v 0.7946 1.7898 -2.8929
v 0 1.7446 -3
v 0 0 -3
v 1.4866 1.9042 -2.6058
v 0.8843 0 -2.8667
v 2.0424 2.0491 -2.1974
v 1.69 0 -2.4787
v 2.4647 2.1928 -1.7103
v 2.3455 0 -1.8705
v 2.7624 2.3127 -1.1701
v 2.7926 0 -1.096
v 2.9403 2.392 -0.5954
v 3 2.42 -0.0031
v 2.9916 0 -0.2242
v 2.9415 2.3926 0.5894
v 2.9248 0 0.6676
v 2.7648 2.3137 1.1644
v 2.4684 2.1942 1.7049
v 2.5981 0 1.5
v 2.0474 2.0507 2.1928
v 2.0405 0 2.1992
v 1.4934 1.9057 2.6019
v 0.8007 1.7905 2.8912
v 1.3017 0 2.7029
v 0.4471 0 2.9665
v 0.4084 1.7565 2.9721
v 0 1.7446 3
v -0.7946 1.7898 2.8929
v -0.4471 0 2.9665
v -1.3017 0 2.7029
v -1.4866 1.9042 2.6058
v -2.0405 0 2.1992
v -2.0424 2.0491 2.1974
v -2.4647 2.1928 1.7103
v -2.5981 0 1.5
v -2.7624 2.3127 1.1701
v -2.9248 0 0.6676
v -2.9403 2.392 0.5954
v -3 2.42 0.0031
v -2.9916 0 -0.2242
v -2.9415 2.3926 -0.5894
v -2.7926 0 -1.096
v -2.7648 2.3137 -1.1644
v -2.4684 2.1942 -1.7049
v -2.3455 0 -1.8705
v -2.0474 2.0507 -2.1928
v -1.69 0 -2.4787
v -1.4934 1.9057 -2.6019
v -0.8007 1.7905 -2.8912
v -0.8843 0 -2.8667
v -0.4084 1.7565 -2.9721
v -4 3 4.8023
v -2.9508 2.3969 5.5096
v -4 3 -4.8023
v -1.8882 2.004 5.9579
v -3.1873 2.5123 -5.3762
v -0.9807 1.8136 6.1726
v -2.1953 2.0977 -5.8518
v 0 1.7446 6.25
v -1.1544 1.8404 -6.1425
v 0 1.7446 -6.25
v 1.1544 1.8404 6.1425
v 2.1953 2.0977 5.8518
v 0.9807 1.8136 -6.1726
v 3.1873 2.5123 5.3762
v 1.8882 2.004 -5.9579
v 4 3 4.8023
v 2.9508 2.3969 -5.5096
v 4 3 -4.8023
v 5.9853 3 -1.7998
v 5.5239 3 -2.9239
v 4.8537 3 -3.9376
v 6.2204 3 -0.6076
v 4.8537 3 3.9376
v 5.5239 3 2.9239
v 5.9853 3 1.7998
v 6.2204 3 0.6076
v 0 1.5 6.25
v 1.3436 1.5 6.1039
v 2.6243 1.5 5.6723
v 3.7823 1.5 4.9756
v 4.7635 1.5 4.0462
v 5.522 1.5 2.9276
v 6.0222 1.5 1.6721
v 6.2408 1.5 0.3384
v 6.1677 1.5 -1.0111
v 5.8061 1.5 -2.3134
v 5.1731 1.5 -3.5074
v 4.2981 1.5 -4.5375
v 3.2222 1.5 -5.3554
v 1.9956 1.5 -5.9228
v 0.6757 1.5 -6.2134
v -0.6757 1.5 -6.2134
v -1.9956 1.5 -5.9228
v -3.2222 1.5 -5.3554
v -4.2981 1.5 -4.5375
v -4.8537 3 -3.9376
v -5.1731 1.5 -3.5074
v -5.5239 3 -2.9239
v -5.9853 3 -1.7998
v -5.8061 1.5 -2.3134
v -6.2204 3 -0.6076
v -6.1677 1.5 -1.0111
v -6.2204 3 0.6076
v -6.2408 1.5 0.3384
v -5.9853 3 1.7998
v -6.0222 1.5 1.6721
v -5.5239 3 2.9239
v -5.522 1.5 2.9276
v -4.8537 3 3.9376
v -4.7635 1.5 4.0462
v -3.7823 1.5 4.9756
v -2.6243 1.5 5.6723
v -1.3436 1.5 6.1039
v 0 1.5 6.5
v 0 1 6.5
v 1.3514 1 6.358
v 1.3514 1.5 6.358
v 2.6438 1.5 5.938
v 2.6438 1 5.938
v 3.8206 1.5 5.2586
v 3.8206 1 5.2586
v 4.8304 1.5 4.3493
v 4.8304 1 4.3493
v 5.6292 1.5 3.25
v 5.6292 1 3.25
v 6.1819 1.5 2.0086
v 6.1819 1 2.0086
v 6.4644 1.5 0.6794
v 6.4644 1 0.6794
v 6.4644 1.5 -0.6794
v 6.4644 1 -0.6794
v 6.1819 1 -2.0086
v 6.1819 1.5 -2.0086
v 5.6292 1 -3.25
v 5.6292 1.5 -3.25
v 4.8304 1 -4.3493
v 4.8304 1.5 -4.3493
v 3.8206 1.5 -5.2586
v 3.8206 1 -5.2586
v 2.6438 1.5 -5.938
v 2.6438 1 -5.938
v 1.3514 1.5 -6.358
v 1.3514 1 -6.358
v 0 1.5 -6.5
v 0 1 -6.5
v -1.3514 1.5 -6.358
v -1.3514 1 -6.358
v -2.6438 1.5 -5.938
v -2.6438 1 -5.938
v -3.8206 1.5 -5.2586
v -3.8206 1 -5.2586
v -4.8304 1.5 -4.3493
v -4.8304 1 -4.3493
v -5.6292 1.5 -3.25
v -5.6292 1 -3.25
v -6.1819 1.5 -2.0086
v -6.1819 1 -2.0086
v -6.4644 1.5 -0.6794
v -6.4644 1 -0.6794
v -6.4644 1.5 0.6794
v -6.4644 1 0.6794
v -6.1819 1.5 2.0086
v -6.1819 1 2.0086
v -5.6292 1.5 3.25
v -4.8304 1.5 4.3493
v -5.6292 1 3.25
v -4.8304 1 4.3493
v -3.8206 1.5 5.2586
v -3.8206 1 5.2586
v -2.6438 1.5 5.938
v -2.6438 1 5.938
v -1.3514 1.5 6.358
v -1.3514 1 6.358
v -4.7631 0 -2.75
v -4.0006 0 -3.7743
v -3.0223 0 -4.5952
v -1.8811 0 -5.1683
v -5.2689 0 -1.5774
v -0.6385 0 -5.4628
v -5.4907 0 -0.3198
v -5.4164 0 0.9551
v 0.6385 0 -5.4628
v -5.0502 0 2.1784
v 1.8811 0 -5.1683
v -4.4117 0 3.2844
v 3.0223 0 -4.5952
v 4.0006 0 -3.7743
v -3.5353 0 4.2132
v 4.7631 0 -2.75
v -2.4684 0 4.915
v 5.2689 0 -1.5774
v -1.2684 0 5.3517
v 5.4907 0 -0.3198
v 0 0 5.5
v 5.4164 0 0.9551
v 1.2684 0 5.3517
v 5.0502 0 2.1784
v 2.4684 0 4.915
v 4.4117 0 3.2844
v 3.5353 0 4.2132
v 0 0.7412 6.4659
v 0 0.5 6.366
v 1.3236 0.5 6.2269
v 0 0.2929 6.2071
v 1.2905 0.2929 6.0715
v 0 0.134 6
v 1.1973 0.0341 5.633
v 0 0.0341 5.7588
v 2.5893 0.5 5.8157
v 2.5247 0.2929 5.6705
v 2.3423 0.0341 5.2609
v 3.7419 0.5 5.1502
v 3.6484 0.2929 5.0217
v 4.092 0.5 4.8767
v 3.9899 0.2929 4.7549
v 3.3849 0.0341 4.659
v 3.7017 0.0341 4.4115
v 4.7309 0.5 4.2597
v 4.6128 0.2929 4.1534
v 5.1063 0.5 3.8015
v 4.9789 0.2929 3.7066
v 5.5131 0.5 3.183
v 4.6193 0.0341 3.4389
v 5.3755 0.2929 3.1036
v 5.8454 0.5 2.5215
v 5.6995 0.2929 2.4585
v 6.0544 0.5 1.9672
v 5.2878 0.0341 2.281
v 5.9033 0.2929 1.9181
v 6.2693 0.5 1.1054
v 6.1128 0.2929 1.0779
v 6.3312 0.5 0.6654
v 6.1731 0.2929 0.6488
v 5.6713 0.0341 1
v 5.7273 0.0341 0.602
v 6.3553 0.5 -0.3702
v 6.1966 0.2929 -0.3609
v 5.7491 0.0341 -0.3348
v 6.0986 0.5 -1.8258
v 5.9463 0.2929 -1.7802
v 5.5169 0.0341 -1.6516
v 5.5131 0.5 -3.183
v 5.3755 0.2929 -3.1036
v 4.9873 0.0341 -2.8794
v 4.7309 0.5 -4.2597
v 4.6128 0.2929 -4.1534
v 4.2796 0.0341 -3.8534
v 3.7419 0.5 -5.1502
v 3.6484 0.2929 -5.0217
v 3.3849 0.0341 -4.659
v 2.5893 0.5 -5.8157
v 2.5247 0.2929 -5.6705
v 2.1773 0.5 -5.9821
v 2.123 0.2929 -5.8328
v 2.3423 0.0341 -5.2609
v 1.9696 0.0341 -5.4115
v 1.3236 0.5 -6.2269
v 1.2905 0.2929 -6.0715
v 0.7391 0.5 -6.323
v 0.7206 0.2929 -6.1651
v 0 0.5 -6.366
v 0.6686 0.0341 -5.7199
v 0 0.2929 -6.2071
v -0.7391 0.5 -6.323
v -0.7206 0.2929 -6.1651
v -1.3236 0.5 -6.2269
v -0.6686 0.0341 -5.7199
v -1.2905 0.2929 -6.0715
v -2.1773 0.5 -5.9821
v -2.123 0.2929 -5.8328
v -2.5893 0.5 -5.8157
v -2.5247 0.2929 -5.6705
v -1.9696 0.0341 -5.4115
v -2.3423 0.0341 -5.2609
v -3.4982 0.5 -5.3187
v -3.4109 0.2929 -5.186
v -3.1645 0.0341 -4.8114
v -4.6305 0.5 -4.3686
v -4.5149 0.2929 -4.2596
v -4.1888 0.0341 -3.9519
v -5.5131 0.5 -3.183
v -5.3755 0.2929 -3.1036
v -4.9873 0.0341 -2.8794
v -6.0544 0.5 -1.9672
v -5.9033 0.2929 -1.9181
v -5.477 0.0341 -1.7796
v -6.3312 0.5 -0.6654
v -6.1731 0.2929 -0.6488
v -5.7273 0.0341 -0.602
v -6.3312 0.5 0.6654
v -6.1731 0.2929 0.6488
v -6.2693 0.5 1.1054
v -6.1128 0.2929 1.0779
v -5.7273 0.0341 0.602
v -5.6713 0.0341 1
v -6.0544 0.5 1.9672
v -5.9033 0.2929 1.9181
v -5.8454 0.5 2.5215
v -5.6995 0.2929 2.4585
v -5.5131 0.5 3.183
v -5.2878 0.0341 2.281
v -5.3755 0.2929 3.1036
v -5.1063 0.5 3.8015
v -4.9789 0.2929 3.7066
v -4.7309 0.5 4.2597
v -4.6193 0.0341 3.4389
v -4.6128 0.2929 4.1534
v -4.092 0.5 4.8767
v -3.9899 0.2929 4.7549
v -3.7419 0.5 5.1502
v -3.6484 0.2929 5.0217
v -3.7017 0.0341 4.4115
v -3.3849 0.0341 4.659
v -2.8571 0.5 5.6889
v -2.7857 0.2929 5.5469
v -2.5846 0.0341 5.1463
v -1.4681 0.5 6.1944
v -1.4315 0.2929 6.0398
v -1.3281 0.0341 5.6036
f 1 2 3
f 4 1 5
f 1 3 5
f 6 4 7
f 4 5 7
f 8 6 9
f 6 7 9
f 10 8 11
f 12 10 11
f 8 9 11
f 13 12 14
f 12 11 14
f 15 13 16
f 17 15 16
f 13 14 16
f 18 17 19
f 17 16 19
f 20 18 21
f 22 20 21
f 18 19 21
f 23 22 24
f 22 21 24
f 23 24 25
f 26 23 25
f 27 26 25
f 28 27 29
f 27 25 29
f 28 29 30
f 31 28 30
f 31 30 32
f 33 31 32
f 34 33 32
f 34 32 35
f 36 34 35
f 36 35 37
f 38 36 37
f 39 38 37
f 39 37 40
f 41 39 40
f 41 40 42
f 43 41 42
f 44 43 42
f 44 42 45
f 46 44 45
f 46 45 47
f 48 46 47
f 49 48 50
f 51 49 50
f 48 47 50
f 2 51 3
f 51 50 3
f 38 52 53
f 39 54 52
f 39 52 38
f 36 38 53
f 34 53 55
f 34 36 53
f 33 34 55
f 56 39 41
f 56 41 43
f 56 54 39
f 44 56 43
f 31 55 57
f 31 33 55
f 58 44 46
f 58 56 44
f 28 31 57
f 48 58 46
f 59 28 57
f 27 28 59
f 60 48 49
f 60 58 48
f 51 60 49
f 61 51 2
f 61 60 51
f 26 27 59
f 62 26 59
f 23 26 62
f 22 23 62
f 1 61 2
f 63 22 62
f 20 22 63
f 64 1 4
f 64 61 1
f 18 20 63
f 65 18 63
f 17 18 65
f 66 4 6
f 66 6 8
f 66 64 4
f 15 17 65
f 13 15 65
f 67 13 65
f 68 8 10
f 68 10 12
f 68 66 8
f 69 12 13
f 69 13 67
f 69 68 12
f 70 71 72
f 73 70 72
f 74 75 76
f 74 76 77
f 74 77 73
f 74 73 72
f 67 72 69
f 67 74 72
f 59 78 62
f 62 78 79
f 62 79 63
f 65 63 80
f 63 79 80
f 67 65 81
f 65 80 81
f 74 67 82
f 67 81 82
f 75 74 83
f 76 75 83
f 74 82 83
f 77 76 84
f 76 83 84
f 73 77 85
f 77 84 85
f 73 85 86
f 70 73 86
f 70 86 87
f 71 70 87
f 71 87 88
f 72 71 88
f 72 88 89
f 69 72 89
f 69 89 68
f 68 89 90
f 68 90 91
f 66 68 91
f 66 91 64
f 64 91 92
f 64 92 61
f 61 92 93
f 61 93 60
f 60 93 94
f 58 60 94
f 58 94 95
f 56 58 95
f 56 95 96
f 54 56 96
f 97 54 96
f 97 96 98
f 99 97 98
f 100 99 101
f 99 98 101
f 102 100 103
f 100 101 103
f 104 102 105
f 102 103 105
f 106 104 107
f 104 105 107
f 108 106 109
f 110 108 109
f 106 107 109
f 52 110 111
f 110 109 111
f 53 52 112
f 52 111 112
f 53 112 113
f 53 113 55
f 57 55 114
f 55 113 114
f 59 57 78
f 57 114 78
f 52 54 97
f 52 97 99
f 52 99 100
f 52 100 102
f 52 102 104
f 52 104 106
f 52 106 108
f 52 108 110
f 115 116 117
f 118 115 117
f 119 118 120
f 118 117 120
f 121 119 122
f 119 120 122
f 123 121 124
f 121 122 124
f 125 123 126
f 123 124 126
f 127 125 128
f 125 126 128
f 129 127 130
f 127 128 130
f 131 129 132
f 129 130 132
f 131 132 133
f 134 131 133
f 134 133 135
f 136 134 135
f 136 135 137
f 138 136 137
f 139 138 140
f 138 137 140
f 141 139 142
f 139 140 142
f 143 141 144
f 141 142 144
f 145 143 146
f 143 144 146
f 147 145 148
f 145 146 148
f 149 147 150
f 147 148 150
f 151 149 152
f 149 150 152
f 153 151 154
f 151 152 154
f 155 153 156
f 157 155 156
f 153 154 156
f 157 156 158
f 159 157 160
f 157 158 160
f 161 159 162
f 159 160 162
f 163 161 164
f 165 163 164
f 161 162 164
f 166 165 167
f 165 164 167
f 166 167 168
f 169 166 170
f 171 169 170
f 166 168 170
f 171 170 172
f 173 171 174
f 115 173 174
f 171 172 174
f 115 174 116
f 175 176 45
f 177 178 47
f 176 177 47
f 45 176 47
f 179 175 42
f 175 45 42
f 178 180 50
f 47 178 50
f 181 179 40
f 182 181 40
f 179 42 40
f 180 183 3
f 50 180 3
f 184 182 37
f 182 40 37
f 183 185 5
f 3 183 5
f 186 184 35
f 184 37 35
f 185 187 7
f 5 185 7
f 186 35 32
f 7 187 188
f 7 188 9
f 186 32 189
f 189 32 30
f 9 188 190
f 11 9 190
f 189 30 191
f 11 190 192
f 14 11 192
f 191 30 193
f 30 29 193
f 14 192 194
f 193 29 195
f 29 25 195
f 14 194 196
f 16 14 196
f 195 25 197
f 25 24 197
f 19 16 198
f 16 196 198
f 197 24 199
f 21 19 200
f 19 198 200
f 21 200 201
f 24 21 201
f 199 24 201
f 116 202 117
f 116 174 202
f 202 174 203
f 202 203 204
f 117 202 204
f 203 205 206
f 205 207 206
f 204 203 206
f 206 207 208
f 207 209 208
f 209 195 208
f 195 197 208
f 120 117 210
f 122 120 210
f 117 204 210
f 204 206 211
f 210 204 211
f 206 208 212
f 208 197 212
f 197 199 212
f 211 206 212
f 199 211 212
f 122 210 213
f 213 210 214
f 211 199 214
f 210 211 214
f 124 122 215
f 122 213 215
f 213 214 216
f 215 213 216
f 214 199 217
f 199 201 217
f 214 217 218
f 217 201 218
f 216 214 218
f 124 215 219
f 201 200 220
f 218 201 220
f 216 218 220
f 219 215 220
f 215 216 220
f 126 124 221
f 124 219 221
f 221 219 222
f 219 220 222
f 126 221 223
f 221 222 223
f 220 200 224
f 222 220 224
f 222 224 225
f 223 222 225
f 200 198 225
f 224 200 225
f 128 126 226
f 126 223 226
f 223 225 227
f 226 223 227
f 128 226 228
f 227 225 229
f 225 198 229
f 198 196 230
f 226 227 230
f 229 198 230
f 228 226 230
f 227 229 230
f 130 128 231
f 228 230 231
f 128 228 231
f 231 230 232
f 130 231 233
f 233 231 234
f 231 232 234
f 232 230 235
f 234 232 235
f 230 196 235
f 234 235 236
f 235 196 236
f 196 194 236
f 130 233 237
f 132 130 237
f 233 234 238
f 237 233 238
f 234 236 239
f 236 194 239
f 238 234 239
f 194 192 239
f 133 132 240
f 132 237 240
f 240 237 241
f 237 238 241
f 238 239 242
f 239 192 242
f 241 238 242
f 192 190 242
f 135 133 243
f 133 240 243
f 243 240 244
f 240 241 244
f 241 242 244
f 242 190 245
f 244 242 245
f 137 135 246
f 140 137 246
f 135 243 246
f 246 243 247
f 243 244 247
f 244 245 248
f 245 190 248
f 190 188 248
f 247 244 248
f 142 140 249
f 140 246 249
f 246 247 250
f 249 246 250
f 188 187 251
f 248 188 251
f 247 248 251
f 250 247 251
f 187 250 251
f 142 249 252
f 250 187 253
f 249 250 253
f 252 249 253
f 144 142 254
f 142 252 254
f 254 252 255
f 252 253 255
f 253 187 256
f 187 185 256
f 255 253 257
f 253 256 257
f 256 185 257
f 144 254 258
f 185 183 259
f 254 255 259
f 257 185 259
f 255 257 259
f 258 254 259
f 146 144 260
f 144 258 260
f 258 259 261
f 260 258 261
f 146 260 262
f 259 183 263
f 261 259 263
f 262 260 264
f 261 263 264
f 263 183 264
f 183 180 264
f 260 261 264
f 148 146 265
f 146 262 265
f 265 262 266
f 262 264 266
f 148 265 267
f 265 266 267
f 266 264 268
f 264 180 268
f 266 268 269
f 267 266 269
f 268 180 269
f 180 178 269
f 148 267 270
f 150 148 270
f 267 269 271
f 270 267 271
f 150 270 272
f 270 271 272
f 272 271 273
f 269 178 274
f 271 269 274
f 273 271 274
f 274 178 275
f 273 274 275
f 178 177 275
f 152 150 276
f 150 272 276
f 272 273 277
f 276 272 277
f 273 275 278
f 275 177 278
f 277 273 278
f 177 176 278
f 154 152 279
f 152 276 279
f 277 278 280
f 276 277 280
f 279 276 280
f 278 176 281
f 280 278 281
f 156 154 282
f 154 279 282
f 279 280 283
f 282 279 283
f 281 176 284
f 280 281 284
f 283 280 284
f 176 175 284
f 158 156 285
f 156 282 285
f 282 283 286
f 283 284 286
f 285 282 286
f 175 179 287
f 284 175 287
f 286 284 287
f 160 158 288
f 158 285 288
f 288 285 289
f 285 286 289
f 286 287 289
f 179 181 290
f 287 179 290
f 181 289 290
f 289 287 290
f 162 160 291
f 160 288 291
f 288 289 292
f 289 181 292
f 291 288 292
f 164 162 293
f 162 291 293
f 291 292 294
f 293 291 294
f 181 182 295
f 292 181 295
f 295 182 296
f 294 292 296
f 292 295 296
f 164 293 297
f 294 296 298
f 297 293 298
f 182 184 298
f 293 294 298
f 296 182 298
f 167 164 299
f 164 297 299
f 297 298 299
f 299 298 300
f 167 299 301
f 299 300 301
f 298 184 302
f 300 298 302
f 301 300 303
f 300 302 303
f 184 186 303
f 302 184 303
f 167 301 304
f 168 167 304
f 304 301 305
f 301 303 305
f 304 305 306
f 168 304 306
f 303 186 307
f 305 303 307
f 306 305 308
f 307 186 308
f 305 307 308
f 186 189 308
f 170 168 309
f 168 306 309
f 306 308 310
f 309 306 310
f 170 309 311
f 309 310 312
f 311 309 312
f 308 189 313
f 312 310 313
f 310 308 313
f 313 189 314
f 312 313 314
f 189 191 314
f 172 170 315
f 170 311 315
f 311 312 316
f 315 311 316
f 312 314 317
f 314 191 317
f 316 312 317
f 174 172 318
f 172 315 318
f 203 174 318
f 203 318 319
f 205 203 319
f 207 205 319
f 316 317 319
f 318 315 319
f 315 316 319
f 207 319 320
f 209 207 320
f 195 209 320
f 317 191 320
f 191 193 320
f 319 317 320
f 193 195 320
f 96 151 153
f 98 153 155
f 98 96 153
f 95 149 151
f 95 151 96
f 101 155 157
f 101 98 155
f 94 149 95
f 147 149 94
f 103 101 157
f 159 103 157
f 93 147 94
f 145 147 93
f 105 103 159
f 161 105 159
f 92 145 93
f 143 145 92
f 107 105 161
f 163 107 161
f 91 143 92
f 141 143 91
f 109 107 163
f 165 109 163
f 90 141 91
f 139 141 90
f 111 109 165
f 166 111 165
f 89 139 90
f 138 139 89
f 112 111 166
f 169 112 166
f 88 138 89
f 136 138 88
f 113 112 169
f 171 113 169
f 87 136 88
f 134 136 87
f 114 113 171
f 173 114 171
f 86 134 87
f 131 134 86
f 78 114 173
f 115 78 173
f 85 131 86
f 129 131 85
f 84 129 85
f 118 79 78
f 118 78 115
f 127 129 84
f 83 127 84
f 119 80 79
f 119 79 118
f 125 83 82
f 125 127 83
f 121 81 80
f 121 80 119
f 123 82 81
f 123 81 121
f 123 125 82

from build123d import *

# Parameters (mm, degrees)
SKETCH_1_R               = 6.5
EXTRUDE_1_DEPTH          = 1.5
FILLET_1_R               = 1
SKETCH_2_R               = 6.25
EXTRUDE_2_DEPTH          = 1.5
CUT_EXTRUDE_1_DEPTH      = 10.66953987
CUT_EXTRUDE_1_DEPTH_BACK = 10.66953987
SKETCH_4_R               = 3
CUT_EXTRUDE_2_DEPTH      = 10.669539901


with BuildPart() as part:
    # 草图1 → 凸台-拉伸1 (new body)
    with BuildSketch(Plane(origin=(0, 0, 0), x_dir=(1, 0, 0), z_dir=(0, 1, 0))):
        with Locations(Location((0, 0, 0), (0, 0, 270))):
            Circle(SKETCH_1_R)
    extrude(amount=EXTRUDE_1_DEPTH)

    # 圆角1
    fillet_1_edges = [part.edges().sort_by_distance(p)[0] for p in [
        (0, 0, -6.5),
    ]]
    fillet(fillet_1_edges, radius=FILLET_1_R)

    # 草图2 → 凸台-拉伸2 (add)
    with BuildSketch(Plane(origin=(0, 1.5, 0), x_dir=(1, 0, 0), z_dir=(0, 1, 0))):
        with Locations(Location((0, 0, 0), (0, 0, 270))):
            Circle(SKETCH_2_R)
    extrude(amount=EXTRUDE_2_DEPTH)

    # 草图3 → 切除-拉伸1 (cut, two sides: drawn at the far end of the back side and taken through both)
    with BuildSketch(Plane.XY.offset(-CUT_EXTRUDE_1_DEPTH_BACK)):
        with BuildLine():
            ThreePointArc((-4, 3), (-2.096194346, 2.065792605), (0, 1.744562647))
            Line((0, 1.744562647), (0, 3))
            Line((0, 3), (-4, 3))
        make_face()
        with BuildLine():
            Line((0, 3), (0, 1.744562647))
            ThreePointArc((0, 1.744562647), (2.096194346, 2.065792605), (4, 3))
            Line((4, 3), (0, 3))
        make_face()
    extrude(amount=CUT_EXTRUDE_1_DEPTH + CUT_EXTRUDE_1_DEPTH_BACK, mode=Mode.SUBTRACT)

    # 草图4 → 切除-拉伸2 (cut, through all)
    with BuildSketch(Plane.XZ):
        with Locations(Location((0, 0, 0), (0, 0, 270))):
            Circle(SKETCH_4_R)
    extrude(amount=-CUT_EXTRUDE_2_DEPTH, mode=Mode.SUBTRACT)


solid = part.part
